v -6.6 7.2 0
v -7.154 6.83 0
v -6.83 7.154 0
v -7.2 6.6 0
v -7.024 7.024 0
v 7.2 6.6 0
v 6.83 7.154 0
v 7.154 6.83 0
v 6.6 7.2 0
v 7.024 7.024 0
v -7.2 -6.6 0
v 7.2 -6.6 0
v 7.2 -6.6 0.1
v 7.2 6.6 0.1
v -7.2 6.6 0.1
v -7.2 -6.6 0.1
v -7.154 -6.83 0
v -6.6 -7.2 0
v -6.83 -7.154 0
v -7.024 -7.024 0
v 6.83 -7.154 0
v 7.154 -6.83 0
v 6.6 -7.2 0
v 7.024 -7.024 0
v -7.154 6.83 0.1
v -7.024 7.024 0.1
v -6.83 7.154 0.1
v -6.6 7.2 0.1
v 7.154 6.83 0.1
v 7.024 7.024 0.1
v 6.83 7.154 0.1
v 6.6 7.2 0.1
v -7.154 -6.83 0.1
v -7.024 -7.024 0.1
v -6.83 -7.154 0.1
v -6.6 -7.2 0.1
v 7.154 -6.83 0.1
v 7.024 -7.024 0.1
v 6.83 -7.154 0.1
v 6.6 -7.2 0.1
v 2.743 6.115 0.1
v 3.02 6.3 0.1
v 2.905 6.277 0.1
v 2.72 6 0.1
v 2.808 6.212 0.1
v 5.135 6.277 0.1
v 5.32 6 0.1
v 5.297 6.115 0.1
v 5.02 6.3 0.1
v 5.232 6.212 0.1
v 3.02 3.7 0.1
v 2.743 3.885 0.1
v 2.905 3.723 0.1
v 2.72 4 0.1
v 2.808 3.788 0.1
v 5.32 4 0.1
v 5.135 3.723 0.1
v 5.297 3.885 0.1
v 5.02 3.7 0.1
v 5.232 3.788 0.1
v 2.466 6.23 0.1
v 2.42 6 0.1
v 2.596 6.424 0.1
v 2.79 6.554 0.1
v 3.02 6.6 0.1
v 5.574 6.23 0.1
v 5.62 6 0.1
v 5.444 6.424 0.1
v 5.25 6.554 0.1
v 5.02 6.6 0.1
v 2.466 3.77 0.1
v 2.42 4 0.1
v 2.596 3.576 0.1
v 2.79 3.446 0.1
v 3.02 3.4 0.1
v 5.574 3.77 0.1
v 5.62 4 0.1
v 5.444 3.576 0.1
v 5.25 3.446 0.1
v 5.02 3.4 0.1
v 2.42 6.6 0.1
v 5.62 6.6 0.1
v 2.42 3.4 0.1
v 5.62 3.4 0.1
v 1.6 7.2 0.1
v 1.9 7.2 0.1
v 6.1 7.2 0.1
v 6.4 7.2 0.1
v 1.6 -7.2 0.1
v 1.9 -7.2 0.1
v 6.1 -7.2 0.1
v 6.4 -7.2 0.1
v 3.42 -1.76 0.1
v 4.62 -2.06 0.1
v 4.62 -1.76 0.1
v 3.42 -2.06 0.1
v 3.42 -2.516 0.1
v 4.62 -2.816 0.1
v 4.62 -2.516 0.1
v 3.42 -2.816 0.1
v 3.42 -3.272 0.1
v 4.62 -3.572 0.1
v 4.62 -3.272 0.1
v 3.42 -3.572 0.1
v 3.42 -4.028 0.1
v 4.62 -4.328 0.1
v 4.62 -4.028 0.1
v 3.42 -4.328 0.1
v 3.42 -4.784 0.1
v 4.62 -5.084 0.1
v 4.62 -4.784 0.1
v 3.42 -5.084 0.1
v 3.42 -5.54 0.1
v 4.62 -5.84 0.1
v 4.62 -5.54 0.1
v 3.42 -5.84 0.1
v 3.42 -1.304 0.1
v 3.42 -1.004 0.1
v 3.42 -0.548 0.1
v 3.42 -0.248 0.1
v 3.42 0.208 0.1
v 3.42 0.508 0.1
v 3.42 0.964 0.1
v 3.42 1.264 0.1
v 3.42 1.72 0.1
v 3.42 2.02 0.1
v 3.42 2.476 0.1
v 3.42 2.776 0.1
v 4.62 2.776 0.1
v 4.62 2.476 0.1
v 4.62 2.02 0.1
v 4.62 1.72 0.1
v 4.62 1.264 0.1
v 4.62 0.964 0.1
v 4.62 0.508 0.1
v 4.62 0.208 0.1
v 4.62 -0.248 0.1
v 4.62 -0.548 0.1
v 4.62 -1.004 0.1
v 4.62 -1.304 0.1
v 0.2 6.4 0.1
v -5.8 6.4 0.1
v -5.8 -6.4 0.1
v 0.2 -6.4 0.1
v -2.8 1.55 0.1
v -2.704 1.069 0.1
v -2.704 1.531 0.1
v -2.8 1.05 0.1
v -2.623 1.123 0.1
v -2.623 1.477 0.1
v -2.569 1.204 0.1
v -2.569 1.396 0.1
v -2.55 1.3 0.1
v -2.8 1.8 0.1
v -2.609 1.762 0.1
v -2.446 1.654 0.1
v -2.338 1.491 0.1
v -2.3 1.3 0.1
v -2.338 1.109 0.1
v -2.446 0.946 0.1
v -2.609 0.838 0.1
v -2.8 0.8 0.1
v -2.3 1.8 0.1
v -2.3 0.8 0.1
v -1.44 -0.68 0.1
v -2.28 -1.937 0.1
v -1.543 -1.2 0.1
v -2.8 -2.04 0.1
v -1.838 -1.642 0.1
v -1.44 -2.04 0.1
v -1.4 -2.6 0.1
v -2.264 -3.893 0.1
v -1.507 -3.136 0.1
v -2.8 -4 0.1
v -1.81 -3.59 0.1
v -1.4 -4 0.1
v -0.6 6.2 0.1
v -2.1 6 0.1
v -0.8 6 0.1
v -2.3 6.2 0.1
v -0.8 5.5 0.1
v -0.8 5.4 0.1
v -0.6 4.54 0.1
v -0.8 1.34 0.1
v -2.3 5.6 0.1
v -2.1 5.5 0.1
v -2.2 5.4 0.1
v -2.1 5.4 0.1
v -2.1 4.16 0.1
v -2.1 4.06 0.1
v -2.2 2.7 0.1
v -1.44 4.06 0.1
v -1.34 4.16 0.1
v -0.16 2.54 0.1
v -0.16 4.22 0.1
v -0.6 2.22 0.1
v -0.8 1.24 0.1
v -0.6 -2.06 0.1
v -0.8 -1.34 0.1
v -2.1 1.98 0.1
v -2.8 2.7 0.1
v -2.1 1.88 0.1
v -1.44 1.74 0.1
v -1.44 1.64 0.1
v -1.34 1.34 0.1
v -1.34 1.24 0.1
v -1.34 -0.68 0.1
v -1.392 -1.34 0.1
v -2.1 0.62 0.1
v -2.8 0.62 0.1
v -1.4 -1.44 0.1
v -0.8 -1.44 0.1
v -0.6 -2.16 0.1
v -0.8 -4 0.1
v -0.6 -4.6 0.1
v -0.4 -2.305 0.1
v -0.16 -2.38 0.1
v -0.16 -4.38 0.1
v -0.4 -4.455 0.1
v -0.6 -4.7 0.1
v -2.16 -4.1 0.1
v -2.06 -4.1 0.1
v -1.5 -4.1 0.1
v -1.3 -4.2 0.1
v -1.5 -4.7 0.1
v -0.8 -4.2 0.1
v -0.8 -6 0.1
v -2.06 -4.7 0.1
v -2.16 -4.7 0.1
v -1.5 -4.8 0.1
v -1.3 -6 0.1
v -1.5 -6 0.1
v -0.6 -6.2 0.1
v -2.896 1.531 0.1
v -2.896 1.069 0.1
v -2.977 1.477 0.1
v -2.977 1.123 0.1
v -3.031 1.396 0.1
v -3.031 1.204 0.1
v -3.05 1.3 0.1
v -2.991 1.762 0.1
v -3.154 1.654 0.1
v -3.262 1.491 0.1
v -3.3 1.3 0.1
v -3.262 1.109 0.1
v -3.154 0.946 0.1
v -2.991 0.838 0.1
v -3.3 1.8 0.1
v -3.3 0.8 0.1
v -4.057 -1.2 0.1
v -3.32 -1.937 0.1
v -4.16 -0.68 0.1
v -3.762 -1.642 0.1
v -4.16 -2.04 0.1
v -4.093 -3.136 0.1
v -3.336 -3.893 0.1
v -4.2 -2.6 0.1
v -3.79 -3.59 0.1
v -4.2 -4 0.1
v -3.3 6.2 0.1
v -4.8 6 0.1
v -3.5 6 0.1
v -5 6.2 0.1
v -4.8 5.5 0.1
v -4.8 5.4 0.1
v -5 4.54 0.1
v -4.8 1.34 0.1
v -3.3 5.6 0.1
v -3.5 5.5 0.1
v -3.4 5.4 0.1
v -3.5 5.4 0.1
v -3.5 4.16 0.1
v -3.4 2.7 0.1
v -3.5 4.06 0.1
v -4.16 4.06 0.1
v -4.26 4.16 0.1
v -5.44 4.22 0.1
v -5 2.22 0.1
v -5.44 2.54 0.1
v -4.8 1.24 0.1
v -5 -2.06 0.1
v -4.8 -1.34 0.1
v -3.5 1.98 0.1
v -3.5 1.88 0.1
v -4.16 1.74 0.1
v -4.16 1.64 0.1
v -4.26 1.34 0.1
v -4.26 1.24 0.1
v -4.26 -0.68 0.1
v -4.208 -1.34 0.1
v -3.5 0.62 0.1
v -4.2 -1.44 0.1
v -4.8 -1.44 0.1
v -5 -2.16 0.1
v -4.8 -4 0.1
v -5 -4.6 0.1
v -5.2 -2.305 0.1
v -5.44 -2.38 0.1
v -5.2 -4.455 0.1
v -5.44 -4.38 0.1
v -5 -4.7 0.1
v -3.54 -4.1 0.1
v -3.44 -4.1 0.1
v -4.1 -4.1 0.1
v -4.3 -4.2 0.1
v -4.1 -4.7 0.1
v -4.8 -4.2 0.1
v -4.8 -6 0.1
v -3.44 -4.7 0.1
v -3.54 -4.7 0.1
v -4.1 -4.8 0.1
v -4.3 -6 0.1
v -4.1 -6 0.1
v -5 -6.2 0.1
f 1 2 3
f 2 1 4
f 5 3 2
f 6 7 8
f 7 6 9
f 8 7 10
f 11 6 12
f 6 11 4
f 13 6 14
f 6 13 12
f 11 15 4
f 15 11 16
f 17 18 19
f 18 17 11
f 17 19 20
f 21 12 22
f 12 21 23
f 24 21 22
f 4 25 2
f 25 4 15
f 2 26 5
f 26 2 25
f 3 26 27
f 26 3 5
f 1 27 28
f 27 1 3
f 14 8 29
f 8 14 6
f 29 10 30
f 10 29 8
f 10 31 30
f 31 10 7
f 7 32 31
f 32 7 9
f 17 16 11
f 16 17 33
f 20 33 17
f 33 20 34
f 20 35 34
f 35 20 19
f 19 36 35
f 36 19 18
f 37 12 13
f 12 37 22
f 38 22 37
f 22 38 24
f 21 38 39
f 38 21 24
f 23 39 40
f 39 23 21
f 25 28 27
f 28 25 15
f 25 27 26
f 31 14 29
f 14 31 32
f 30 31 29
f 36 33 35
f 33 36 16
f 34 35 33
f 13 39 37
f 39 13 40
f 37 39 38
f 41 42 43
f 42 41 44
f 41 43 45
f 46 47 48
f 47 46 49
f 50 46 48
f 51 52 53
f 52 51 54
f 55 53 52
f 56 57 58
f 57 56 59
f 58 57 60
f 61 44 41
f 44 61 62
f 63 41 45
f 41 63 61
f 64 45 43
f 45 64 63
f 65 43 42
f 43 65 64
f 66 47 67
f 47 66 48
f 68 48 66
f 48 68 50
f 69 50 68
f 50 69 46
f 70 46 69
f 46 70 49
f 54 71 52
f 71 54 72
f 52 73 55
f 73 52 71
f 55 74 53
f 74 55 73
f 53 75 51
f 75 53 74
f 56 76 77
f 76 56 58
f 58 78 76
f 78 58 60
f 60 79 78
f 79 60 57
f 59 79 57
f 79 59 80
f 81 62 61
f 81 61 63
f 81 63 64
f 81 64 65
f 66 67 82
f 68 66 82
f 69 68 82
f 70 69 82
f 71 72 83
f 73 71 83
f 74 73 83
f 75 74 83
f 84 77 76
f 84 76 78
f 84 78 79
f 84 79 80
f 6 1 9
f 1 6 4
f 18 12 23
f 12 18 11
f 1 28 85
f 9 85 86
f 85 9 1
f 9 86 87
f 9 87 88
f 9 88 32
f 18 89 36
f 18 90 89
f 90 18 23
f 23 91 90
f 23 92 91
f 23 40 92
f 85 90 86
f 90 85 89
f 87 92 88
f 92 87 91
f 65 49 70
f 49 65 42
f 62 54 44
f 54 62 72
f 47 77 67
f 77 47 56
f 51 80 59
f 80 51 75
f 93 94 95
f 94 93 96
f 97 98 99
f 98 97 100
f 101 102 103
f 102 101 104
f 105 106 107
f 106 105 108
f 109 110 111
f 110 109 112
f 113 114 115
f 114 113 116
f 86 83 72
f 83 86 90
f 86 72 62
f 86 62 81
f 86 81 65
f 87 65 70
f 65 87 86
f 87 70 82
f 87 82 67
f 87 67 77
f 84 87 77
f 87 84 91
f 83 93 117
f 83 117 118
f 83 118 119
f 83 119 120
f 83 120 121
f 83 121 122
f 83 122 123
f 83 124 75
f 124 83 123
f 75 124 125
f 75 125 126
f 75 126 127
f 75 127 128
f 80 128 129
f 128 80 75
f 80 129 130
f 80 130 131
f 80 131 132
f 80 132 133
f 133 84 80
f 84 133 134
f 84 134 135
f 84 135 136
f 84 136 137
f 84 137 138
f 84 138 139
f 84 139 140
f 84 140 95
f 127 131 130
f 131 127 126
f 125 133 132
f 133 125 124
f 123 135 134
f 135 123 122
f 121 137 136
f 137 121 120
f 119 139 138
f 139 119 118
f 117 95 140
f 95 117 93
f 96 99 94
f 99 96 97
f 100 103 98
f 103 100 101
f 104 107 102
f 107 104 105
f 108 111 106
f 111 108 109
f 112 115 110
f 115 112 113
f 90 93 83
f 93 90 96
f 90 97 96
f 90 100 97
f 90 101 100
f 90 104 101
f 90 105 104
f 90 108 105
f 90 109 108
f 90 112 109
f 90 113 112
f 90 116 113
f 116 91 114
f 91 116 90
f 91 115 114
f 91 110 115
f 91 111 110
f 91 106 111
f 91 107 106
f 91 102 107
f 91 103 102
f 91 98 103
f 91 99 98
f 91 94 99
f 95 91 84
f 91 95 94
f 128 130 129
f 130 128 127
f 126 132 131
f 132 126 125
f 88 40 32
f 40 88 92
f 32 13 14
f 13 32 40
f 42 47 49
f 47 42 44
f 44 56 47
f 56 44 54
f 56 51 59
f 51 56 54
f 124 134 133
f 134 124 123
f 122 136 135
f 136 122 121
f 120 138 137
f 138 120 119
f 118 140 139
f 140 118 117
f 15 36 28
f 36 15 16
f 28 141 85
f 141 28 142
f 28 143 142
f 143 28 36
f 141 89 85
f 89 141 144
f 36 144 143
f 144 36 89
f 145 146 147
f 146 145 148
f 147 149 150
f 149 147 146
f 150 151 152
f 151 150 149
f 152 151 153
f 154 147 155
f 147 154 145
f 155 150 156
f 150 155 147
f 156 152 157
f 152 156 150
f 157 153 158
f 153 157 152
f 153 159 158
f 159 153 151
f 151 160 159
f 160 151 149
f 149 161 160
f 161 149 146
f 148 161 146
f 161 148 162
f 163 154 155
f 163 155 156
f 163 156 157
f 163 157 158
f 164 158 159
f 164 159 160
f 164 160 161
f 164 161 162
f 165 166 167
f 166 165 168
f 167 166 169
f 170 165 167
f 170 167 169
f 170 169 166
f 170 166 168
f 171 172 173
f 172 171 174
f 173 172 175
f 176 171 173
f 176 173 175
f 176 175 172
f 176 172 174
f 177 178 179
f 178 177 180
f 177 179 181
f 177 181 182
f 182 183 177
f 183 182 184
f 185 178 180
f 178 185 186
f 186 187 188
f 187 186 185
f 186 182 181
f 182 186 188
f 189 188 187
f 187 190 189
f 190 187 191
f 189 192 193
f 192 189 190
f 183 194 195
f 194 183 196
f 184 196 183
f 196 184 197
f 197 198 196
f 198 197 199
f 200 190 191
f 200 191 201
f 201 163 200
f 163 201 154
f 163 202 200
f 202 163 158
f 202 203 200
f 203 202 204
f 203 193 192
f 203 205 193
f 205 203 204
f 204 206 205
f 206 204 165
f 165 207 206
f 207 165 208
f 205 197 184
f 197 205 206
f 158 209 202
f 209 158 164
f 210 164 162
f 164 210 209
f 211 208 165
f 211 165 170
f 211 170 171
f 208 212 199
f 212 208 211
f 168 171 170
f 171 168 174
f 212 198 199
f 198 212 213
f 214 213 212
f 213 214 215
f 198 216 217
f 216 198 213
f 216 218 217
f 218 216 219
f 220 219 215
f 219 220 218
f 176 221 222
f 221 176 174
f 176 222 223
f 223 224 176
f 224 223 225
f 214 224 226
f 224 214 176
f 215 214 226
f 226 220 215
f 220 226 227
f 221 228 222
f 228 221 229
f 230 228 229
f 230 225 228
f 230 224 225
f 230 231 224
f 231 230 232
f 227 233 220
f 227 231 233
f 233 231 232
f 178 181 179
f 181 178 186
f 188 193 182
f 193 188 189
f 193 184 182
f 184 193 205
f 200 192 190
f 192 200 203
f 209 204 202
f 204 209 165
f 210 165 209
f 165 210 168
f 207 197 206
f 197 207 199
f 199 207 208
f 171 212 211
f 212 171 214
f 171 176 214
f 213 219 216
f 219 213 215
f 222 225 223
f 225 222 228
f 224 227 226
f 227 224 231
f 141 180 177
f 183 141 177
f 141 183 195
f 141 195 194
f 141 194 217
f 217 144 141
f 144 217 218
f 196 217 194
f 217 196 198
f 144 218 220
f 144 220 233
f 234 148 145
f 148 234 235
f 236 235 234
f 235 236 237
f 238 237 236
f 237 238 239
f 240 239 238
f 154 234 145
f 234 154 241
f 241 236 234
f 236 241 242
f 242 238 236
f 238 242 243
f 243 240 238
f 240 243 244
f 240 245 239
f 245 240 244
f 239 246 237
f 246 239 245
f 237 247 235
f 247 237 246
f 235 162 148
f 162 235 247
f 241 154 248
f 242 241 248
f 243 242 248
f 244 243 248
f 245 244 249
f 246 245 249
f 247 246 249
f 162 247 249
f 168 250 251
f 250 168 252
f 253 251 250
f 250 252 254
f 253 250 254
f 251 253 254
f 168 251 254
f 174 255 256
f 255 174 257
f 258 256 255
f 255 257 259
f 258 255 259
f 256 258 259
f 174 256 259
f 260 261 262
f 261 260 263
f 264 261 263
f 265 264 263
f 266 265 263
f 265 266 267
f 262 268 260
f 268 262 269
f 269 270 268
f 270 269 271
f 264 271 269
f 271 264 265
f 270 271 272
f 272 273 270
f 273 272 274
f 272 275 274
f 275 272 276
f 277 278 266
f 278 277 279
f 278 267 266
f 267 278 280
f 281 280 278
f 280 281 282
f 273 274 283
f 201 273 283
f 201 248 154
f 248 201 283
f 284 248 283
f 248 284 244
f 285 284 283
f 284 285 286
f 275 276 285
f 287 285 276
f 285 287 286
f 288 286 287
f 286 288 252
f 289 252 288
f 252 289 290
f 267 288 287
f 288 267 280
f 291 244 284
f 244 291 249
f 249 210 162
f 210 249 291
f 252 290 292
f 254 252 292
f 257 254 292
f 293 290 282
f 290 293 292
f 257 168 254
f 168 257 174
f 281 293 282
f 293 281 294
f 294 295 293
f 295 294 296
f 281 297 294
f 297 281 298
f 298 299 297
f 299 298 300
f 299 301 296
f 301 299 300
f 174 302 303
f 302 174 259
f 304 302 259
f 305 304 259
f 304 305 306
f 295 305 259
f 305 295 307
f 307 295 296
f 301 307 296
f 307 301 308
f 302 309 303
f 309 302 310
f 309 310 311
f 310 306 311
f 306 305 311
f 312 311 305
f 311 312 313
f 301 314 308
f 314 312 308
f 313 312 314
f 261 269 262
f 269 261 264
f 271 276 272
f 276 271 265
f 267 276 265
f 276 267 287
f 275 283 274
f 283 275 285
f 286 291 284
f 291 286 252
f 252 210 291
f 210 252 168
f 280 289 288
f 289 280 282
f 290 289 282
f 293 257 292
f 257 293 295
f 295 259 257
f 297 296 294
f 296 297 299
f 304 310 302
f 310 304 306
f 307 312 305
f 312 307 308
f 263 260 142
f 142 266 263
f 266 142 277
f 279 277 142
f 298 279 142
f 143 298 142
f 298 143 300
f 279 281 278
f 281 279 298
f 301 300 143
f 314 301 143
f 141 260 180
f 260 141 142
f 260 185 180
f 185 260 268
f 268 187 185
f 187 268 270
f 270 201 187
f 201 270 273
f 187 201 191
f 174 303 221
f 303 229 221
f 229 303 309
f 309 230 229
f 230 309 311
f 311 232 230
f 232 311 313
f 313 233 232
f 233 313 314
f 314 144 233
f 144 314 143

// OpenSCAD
// file: ../p/2-4ring1.scad
use <../lib.scad>
function ldraw_lib__2_4ring1() = [
// 0 Ring  1 x 0.5
// 0 Name: 2-4ring1.dat
// 0 Author: Chris Dee [cwdee]
// 0 !LDRAW_ORG Primitive UPDATE 2003-02
// 0 !LICENSE Licensed under CC BY 4.0 : see CAreadme.txt
// 
// 0 BFC CERTIFY CCW
  [0,"BFC","CERTIFY"],
  [0,"BFC","CCW"],
// 
// 0 !HISTORY 2000-09-30 [PTadmin] Official Update 2000-02
// 0 !HISTORY 2002-08-31 [izanette] Modified with WINDZ for BFC compliance
// 0 !HISTORY 2003-08-01 [PTadmin] Official Update 2003-02
// 0 !HISTORY 2007-06-24 [PTadmin] Header formatted for Contributor Agreement
// 0 !HISTORY 2008-07-01 [PTadmin] Official Update 2008-01
// 
// 
// 4 16 2 0 0 1.8478 0 0.7654 0.9239 0 0.3827 1 0 0
  [4,16,2,0,0,1.8478,0,0.7654,0.9239,0,0.3827,1,0,0],
// 4 16 1.8478 0 0.7654 1.4142 0 1.4142 0.7071 0 0.7071 0.9239 0 0.3827
  [4,16,1.8478,0,0.7654,1.4142,0,1.4142,0.7071,0,0.7071,0.9239,0,0.3827],
// 4 16 1.4142 0 1.4142 0.7654 0 1.8478 0.3827 0 0.9239 0.7071 0 0.7071
  [4,16,1.4142,0,1.4142,0.7654,0,1.8478,0.3827,0,0.9239,0.7071,0,0.7071],
// 4 16 0.7654 0 1.8478 0 0 2 0 0 1 0.3827 0 0.9239
  [4,16,0.7654,0,1.8478,0,0,2,0,0,1,0.3827,0,0.9239],
// 4 16 0 0 2 -0.7654 0 1.8478 -0.3827 0 0.9239 0 0 1
  [4,16,0,0,2,-0.7654,0,1.8478,-0.3827,0,0.9239,0,0,1],
// 4 16 -0.7654 0 1.8478 -1.4142 0 1.4142 -0.7071 0 0.7071 -0.3827 0 0.9239
  [4,16,-0.7654,0,1.8478,-1.4142,0,1.4142,-0.7071,0,0.7071,-0.3827,0,0.9239],
// 4 16 -1.4142 0 1.4142 -1.8478 0 0.7654 -0.9239 0 0.3827 -0.7071 0 0.7071
  [4,16,-1.4142,0,1.4142,-1.8478,0,0.7654,-0.9239,0,0.3827,-0.7071,0,0.7071],
// 4 16 -1.8478 0 0.7654 -2 0 0 -1 0 0 -0.9239 0 0.3827
  [4,16,-1.8478,0,0.7654,-2,0,0,-1,0,0,-0.9239,0,0.3827],
// 0
// 
];
module ldraw_lib__2_4ring1(step=0, col=false, unit=2/5, alt=false, line=0.2, solid=!$preview)
    makepoly(ldraw_lib__2_4ring1(), step=step, col=col, unit=unit, alt=alt, line=line, solid=solid);
ldraw_lib__2_4ring1(line=0.2);
// file: ../p/2-4ndis.scad
use <../lib.scad>
function ldraw_lib__2_4ndis() = [
// 0 Disc Negative 0.5
// 0 Name: 2-4ndis.dat
// 0 Author: James Jessiman
// 0 !LDRAW_ORG Primitive UPDATE 2012-01
// 0 !LICENSE Licensed under CC BY 4.0 : see CAreadme.txt
// 
// 0 BFC CERTIFY CCW
  [0,"BFC","CERTIFY"],
  [0,"BFC","CCW"],
// 
// 0 !HISTORY 2002-03-23 [sbliss] Added BFC statement; compacted code
// 0 !HISTORY 2002-04-25 [PTadmin] Official Update 2002-02
// 0 !HISTORY 2007-06-24 [PTadmin] Header formatted for Contributor Agreement
// 0 !HISTORY 2008-07-01 [PTadmin] Official Update 2008-01
// 0 !HISTORY 2012-02-16 [Philo] Changed to CCW
// 0 !HISTORY 2012-03-30 [PTadmin] Official Update 2012-01
// 
// 
// 3 16 0.9239 0 0.3827 1 0 0 1 0 1
  [3,16,0.9239,0,0.3827,1,0,0,1,0,1],
// 3 16 0.7071 0 0.7071 0.9239 0 0.3827 1 0 1
  [3,16,0.7071,0,0.7071,0.9239,0,0.3827,1,0,1],
// 3 16 0.3827 0 0.9239 0.7071 0 0.7071 1 0 1
  [3,16,0.3827,0,0.9239,0.7071,0,0.7071,1,0,1],
// 3 16 0 0 1 0.3827 0 0.9239 1 0 1
  [3,16,0,0,1,0.3827,0,0.9239,1,0,1],
// 3 16 -0.3827 0 0.9239 0 0 1 -1 0 1
  [3,16,-0.3827,0,0.9239,0,0,1,-1,0,1],
// 3 16 -0.7071 0 0.7071 -0.3827 0 0.9239 -1 0 1
  [3,16,-0.7071,0,0.7071,-0.3827,0,0.9239,-1,0,1],
// 3 16 -0.9239 0 0.3827 -0.7071 0 0.7071 -1 0 1
  [3,16,-0.9239,0,0.3827,-0.7071,0,0.7071,-1,0,1],
// 3 16 -1 0 0 -0.9239 0 0.3827 -1 0 1
  [3,16,-1,0,0,-0.9239,0,0.3827,-1,0,1],
];
module ldraw_lib__2_4ndis(step=0, col=false, unit=2/5, alt=false, line=0.2, solid=!$preview)
    makepoly(ldraw_lib__2_4ndis(), step=step, col=col, unit=unit, alt=alt, line=line, solid=solid);
ldraw_lib__2_4ndis(line=0.2);
// file: ../p/2-4chrd.scad
use <../lib.scad>
function ldraw_lib__2_4chrd() = [
// 0 Chord 0.5
// 0 Name: 2-4chrd.dat
// 0 Author: Philippe Hurbain [Philo]
// 0 !LDRAW_ORG Primitive UPDATE 2014-01
// 0 !LICENSE Licensed under CC BY 4.0 : see CAreadme.txt
// 
// 0 BFC CERTIFY CCW
  [0,"BFC","CERTIFY"],
  [0,"BFC","CCW"],
// 
// 0 !HISTORY 2014-06-21 [PTadmin] Official Update 2014-01
// 
// 
// 4 16 0.9239 0 0.3827 -0.9239 0 0.3827 -1 0 0 1 0 0
  [4,16,0.9239,0,0.3827,-0.9239,0,0.3827,-1,0,0,1,0,0],
// 4 16 0.7071 0 0.7071 -0.7071 0 0.7071 -0.9239 0 0.3827 0.9239 0 0.3827
  [4,16,0.7071,0,0.7071,-0.7071,0,0.7071,-0.9239,0,0.3827,0.9239,0,0.3827],
// 4 16 0.3827 0 0.9239 -0.3827 0 0.9239 -0.7071 0 0.7071 0.7071 0 0.7071
  [4,16,0.3827,0,0.9239,-0.3827,0,0.9239,-0.7071,0,0.7071,0.7071,0,0.7071],
// 3 16 0 0 1 -0.3827 0 0.9239 0.3827 0 0.9239
  [3,16,0,0,1,-0.3827,0,0.9239,0.3827,0,0.9239],
];
module ldraw_lib__2_4chrd(step=0, col=false, unit=2/5, alt=false, line=0.2, solid=!$preview)
    makepoly(ldraw_lib__2_4chrd(), step=step, col=col, unit=unit, alt=alt, line=line, solid=solid);
ldraw_lib__2_4chrd(line=0.2);
// file: ../p/box3u12.scad
use <../lib.scad>
function ldraw_lib__box3u12() = [
// 0 Box with 3 Parallel Faces without Any Edges
// 0 Name: box3u12.dat
// 0 Author: J.C. Tchang [tchang]
// 0 !LDRAW_ORG Primitive UPDATE 2014-02
// 0 !LICENSE Licensed under CC BY 4.0 : see CAreadme.txt
// 
// 0 BFC CERTIFY CCW
  [0,"BFC","CERTIFY"],
  [0,"BFC","CCW"],
// 
// 0 !HISTORY 2014-12-23 [PTadmin] Official Update 2014-02
// 
// 
// 4 16 -1 1 1 1 1 1 1 1 -1 -1 1 -1
  [4,16,-1,1,1,1,1,1,1,1,-1,-1,1,-1],
// 4 16 -1 1 1 -1 0 1 1 0 1 1 1 1
  [4,16,-1,1,1,-1,0,1,1,0,1,1,1,1],
// 4 16 1 1 -1 1 0 -1 -1 0 -1 -1 1 -1
  [4,16,1,1,-1,1,0,-1,-1,0,-1,-1,1,-1],
];
module ldraw_lib__box3u12(step=0, col=false, unit=2/5, alt=false, line=0.2, solid=!$preview)
    makepoly(ldraw_lib__box3u12(), step=step, col=col, unit=unit, alt=alt, line=line, solid=solid);
ldraw_lib__box3u12(line=0.2);
// file: ../p/1-4ring1.scad
use <../lib.scad>
function ldraw_lib__1_4ring1() = [
// 0 Ring  1 x 0.25
// 0 Name: 1-4ring1.dat
// 0 Author: Chris Dee [cwdee]
// 0 !LDRAW_ORG Primitive UPDATE 2012-01
// 0 !LICENSE Licensed under CC BY 4.0 : see CAreadme.txt
// 
// 0 BFC CERTIFY CCW
  [0,"BFC","CERTIFY"],
  [0,"BFC","CCW"],
// 
// 0 !HISTORY 2000-05-07 [PTadmin] Official Update 2000-01
// 0 !HISTORY 2002-11-22 [hafhead] Added BFC statement
// 0 !HISTORY 2002-11-30 [PTadmin] Official Update 2002-05
// 0 !HISTORY 2007-06-22 [PTadmin] Header formatted for Contributor Agreement
// 0 !HISTORY 2008-07-01 [PTadmin] Official Update 2008-01
// 0 !HISTORY 2012-02-16 [Philo] Changed to CCW
// 0 !HISTORY 2012-03-30 [PTadmin] Official Update 2012-01
// 
// 
// 4 16 2 0 0 1.8478 0 0.7654 0.9239 0 0.3827 1 0 0
  [4,16,2,0,0,1.8478,0,0.7654,0.9239,0,0.3827,1,0,0],
// 4 16 1.8478 0 0.7654 1.4142 0 1.4142 0.7071 0 0.7071 0.9239 0 0.3827
  [4,16,1.8478,0,0.7654,1.4142,0,1.4142,0.7071,0,0.7071,0.9239,0,0.3827],
// 4 16 1.4142 0 1.4142 0.7654 0 1.8478 0.3827 0 0.9239 0.7071 0 0.7071
  [4,16,1.4142,0,1.4142,0.7654,0,1.8478,0.3827,0,0.9239,0.7071,0,0.7071],
// 4 16 0.7654 0 1.8478 0 0 2 0 0 1 0.3827 0 0.9239
  [4,16,0.7654,0,1.8478,0,0,2,0,0,1,0.3827,0,0.9239],
];
module ldraw_lib__1_4ring1(step=0, col=false, unit=2/5, alt=false, line=0.2, solid=!$preview)
    makepoly(ldraw_lib__1_4ring1(), step=step, col=col, unit=unit, alt=alt, line=line, solid=solid);
ldraw_lib__1_4ring1(line=0.2);
// file: ../p/1-4ndis.scad
use <../lib.scad>
function ldraw_lib__1_4ndis() = [
// 0 Disc Negative 0.25
// 0 Name: 1-4ndis.dat
// 0 Author: James Jessiman
// 0 !LDRAW_ORG Primitive UPDATE 2012-01
// 0 !LICENSE Licensed under CC BY 4.0 : see CAreadme.txt
// 
// 0 BFC CERTIFY CCW
  [0,"BFC","CERTIFY"],
  [0,"BFC","CCW"],
// 
// 0 !HISTORY 2002-03-23 [sbliss] Added BFC Statement
// 0 !HISTORY 2002-04-25 [PTadmin] Official Update 2002-02
// 0 !HISTORY 2007-06-22 [PTadmin] Header formatted for Contributor Agreement
// 0 !HISTORY 2008-07-01 [PTadmin] Official Update 2008-01
// 0 !HISTORY 2012-02-16 [Philo] Changed to CCW
// 0 !HISTORY 2012-03-30 [PTadmin] Official Update 2012-01
// 
// 
// 3 16 0.9239 0 0.3827 1 0 0 1 0 1
  [3,16,0.9239,0,0.3827,1,0,0,1,0,1],
// 3 16 0.7071 0 0.7071 0.9239 0 0.3827 1 0 1
  [3,16,0.7071,0,0.7071,0.9239,0,0.3827,1,0,1],
// 3 16 0.3827 0 0.9239 0.7071 0 0.7071 1 0 1
  [3,16,0.3827,0,0.9239,0.7071,0,0.7071,1,0,1],
// 3 16 0 0 1 0.3827 0 0.9239 1 0 1
  [3,16,0,0,1,0.3827,0,0.9239,1,0,1],
];
module ldraw_lib__1_4ndis(step=0, col=false, unit=2/5, alt=false, line=0.2, solid=!$preview)
    makepoly(ldraw_lib__1_4ndis(), step=step, col=col, unit=unit, alt=alt, line=line, solid=solid);
ldraw_lib__1_4ndis(line=0.2);
// file: ../p/1-4cyli.scad
use <../lib.scad>
function ldraw_lib__1_4cyli() = [
// 0 Cylinder 0.25
// 0 Name: 1-4cyli.dat
// 0 Author: James Jessiman
// 0 !LDRAW_ORG Primitive UPDATE 2012-01
// 0 !LICENSE Licensed under CC BY 4.0 : see CAreadme.txt
// 
// 0 BFC CERTIFY CCW
  [0,"BFC","CERTIFY"],
  [0,"BFC","CCW"],
// 
// 0 !HISTORY 2002-03-23 [sbliss] Added BFC statement.
// 0 !HISTORY 2002-04-25 [PTadmin] Official Update 2002-02
// 0 !HISTORY 2007-06-22 [PTadmin] Header formatted for Contributor Agreement
// 0 !HISTORY 2008-07-01 [PTadmin] Official Update 2008-01
// 0 !HISTORY 2012-02-16 [Philo] Changed to CCW
// 0 !HISTORY 2012-03-30 [PTadmin] Official Update 2012-01
// 
// 
// 4 16 1 1 0 0.9239 1 0.3827 0.9239 0 0.3827 1 0 0
  [4,16,1,1,0,0.9239,1,0.3827,0.9239,0,0.3827,1,0,0],
// 5 24 1 0 0 1 1 0 0.9239 0 0.3827 1 0 -1
  [5,24,1,0,0,1,1,0,0.9239,0,0.3827,1,0,-1],
// 4 16 0.9239 1 0.3827 0.7071 1 0.7071 0.7071 0 0.7071 0.9239 0 0.3827
  [4,16,0.9239,1,0.3827,0.7071,1,0.7071,0.7071,0,0.7071,0.9239,0,0.3827],
// 5 24 0.9239 0 0.3827 0.9239 1 0.3827 0.7071 0 0.7071 1 0 0
  [5,24,0.9239,0,0.3827,0.9239,1,0.3827,0.7071,0,0.7071,1,0,0],
// 4 16 0.7071 1 0.7071 0.3827 1 0.9239 0.3827 0 0.9239 0.7071 0 0.7071
  [4,16,0.7071,1,0.7071,0.3827,1,0.9239,0.3827,0,0.9239,0.7071,0,0.7071],
// 5 24 0.7071 0 0.7071 0.7071 1 0.7071 0.3827 0 0.9239 0.9239 0 0.3827
  [5,24,0.7071,0,0.7071,0.7071,1,0.7071,0.3827,0,0.9239,0.9239,0,0.3827],
// 4 16 0.3827 1 0.9239 0 1 1 0 0 1 0.3827 0 0.9239
  [4,16,0.3827,1,0.9239,0,1,1,0,0,1,0.3827,0,0.9239],
// 5 24 0.3827 0 0.9239 0.3827 1 0.9239 0 0 1 0.7071 0 0.7071
  [5,24,0.3827,0,0.9239,0.3827,1,0.9239,0,0,1,0.7071,0,0.7071],
// 5 24 0 0 1 0 1 1 0.3827 0 0.9239 -1 0 1
  [5,24,0,0,1,0,1,1,0.3827,0,0.9239,-1,0,1],
];
module ldraw_lib__1_4cyli(step=0, col=false, unit=2/5, alt=false, line=0.2, solid=!$preview)
    makepoly(ldraw_lib__1_4cyli(), step=step, col=col, unit=unit, alt=alt, line=line, solid=solid);
ldraw_lib__1_4cyli(line=0.2);
// file: ../p/1-4chrd.scad
use <../lib.scad>
function ldraw_lib__1_4chrd() = [
// 0 Chord 0.25
// 0 Name: 1-4chrd.dat
// 0 Author: Max Martin Richter [MMR1988]
// 0 !LDRAW_ORG Primitive UPDATE 2023-05
// 0 !LICENSE Licensed under CC BY 4.0 : see CAreadme.txt
// 
// 0 BFC CERTIFY CCW
  [0,"BFC","CERTIFY"],
  [0,"BFC","CCW"],
// 
// 0 !HISTORY 2004-04-22 [PTadmin] Official Update 2004-02
// 0 !HISTORY 2007-10-09 [PTadmin] Header formatted for Contributor Agreement
// 0 !HISTORY 2008-07-01 [PTadmin] Official Update 2008-01
// 0 !HISTORY 2012-08-02 [MMR1988] Re-creation with PrimGen2 and Rectifier
// 0 !HISTORY 2012-08-09 [PTadmin] Official Update 2012-02
// 0 !HISTORY 2023-10-27 [OrionP] Change author to MMR1988 from hafhead
// 0 !HISTORY 2023-10-31 [OrionP] Official Update 2023-05
// 
// 4 16 0.9239 0 0.3827 0.3827 0 0.9239 0 0 1 1 0 0
  [4,16,0.9239,0,0.3827,0.3827,0,0.9239,0,0,1,1,0,0],
// 3 16 0.7071 0 0.7071 0.3827 0 0.9239 0.9239 0 0.3827
  [3,16,0.7071,0,0.7071,0.3827,0,0.9239,0.9239,0,0.3827],
];
module ldraw_lib__1_4chrd(step=0, col=false, unit=2/5, alt=false, line=0.2, solid=!$preview)
    makepoly(ldraw_lib__1_4chrd(), step=step, col=col, unit=unit, alt=alt, line=line, solid=solid);
ldraw_lib__1_4chrd(line=0.2);
// main file
use <../lib.scad>
use <s/6148328cs01.scad>
use <s/6148328cs02.scad>
function ldraw_lib__6148328c() = [
// 0 Sticker  1.8 x  1.8 with Red Car and Grey Stripe on White Background
// 0 Name: 6148328c.dat
// 0 Author: Massimo Maso [Sirio]
// 0 !LDRAW_ORG Part UPDATE 2024-08
// 0 !LICENSE Licensed under CC BY 4.0 : see CAreadme.txt
// 
// 0 BFC CERTIFY CCW
  [0,"BFC","CERTIFY"],
  [0,"BFC","CCW"],
// 
// 0 !KEYWORDS 917K, 919, Bricklink 75876stk01, Brickowl 852010, Hybrid, Pit Lane
// 0 !KEYWORDS Porsche, Rebrickable 26357, set 75876, Speed Champions
// 
// 0 !HISTORY 2024-09-30 [OrionP] Official Update 2024-08
// 
// 0 // Subpart
// 1 16 0 0 0 1 0 0 0 1 0 0 0 1 s\6148328cs01.dat
  [1,16,0,0,0,1,0,0,0,1,0,0,0,1, ldraw_lib__s__6148328cs01()],
// 1 16 -7 -.25 0 1 0 0 0 1 0 0 0 1 s\6148328cs02.dat
  [1,16,-7,-.25,0,1,0,0,0,1,0,0,0,1, ldraw_lib__s__6148328cs02()],
// 1 16 -7 -.25 0 -1 0 0 0 1 0 0 0 1 s\6148328cs02.dat
  [1,16,-7,-.25,0,-1,0,0,0,1,0,0,0,1, ldraw_lib__s__6148328cs02()],
// 0 // Complementary faces
// 4 15 -8.25 -.25 15.5 -5.75 -.25 15.5 .5 -.25 16 -14.5 -.25 16
  [4,15,-8.25,-.25,15.5,-5.75,-.25,15.5,.5,-.25,16,-14.5,-.25,16],
// 4 15 -8.25 -.25 15.5 -8.25 -.25 14 -5.75 -.25 14 -5.75 -.25 15.5
  [4,15,-8.25,-.25,15.5,-8.25,-.25,14,-5.75,-.25,14,-5.75,-.25,15.5],
// 4 0 -8.5 -.25 13.5 -5.5 -.25 13.5 -5.75 -.25 14 -8.25 -.25 14
  [4,0,-8.5,-.25,13.5,-5.5,-.25,13.5,-5.75,-.25,14,-8.25,-.25,14],
// 4 4 -8.5 -.25 6.75 -7 -.25 6.75 -5.5 -.25 13.5 -8.5 -.25 13.5
  [4,4,-8.5,-.25,6.75,-7,-.25,6.75,-5.5,-.25,13.5,-8.5,-.25,13.5],
// 3 4 -5.5 -.25 13.5 -7 -.25 6.75 -5.5 -.25 6.75
  [3,4,-5.5,-.25,13.5,-7,-.25,6.75,-5.5,-.25,6.75],
// 3 0 -7 -.25 -10 -8.6 -.25 -10.25 -5.4 -.25 -10.25
  [3,0,-7,-.25,-10,-8.6,-.25,-10.25,-5.4,-.25,-10.25],
// 4 4 -8.6 -.25 -11.75 -5.4 -.25 -11.75 -5.4 -.25 -10.25 -8.6 -.25 -10.25
  [4,4,-8.6,-.25,-11.75,-5.4,-.25,-11.75,-5.4,-.25,-10.25,-8.6,-.25,-10.25],
// 4 0 -8.6 -.25 -11.75 -10.25 -.25 -12 -3.75 -.25 -12 -5.4 -.25 -11.75
  [4,0,-8.6,-.25,-11.75,-10.25,-.25,-12,-3.75,-.25,-12,-5.4,-.25,-11.75],
// 4 4 -10.25 -.25 -15 -3.75 -.25 -15 -3.75 -.25 -12 -10.25 -.25 -12
  [4,4,-10.25,-.25,-15,-3.75,-.25,-15,-3.75,-.25,-12,-10.25,-.25,-12],
// 4 0 -10.25 -.25 -15 -12.5 -.25 -15.5 -1.5 -.25 -15.5 -3.75 -.25 -15
  [4,0,-10.25,-.25,-15,-12.5,-.25,-15.5,-1.5,-.25,-15.5,-3.75,-.25,-15],
// 4 15 -12.5 -.25 -15.5 -14.5 -.25 -16 .5 -.25 -16 -1.5 -.25 -15.5
  [4,15,-12.5,-.25,-15.5,-14.5,-.25,-16,.5,-.25,-16,-1.5,-.25,-15.5],
];
module ldraw_lib__6148328c(step=0, col=false, unit=2/5, alt=false, line=0.2, solid=!$preview)
    makepoly(ldraw_lib__6148328c(), step=step, col=col, unit=unit, alt=alt, line=line, solid=solid);
ldraw_lib__6148328c(line=0.2);
